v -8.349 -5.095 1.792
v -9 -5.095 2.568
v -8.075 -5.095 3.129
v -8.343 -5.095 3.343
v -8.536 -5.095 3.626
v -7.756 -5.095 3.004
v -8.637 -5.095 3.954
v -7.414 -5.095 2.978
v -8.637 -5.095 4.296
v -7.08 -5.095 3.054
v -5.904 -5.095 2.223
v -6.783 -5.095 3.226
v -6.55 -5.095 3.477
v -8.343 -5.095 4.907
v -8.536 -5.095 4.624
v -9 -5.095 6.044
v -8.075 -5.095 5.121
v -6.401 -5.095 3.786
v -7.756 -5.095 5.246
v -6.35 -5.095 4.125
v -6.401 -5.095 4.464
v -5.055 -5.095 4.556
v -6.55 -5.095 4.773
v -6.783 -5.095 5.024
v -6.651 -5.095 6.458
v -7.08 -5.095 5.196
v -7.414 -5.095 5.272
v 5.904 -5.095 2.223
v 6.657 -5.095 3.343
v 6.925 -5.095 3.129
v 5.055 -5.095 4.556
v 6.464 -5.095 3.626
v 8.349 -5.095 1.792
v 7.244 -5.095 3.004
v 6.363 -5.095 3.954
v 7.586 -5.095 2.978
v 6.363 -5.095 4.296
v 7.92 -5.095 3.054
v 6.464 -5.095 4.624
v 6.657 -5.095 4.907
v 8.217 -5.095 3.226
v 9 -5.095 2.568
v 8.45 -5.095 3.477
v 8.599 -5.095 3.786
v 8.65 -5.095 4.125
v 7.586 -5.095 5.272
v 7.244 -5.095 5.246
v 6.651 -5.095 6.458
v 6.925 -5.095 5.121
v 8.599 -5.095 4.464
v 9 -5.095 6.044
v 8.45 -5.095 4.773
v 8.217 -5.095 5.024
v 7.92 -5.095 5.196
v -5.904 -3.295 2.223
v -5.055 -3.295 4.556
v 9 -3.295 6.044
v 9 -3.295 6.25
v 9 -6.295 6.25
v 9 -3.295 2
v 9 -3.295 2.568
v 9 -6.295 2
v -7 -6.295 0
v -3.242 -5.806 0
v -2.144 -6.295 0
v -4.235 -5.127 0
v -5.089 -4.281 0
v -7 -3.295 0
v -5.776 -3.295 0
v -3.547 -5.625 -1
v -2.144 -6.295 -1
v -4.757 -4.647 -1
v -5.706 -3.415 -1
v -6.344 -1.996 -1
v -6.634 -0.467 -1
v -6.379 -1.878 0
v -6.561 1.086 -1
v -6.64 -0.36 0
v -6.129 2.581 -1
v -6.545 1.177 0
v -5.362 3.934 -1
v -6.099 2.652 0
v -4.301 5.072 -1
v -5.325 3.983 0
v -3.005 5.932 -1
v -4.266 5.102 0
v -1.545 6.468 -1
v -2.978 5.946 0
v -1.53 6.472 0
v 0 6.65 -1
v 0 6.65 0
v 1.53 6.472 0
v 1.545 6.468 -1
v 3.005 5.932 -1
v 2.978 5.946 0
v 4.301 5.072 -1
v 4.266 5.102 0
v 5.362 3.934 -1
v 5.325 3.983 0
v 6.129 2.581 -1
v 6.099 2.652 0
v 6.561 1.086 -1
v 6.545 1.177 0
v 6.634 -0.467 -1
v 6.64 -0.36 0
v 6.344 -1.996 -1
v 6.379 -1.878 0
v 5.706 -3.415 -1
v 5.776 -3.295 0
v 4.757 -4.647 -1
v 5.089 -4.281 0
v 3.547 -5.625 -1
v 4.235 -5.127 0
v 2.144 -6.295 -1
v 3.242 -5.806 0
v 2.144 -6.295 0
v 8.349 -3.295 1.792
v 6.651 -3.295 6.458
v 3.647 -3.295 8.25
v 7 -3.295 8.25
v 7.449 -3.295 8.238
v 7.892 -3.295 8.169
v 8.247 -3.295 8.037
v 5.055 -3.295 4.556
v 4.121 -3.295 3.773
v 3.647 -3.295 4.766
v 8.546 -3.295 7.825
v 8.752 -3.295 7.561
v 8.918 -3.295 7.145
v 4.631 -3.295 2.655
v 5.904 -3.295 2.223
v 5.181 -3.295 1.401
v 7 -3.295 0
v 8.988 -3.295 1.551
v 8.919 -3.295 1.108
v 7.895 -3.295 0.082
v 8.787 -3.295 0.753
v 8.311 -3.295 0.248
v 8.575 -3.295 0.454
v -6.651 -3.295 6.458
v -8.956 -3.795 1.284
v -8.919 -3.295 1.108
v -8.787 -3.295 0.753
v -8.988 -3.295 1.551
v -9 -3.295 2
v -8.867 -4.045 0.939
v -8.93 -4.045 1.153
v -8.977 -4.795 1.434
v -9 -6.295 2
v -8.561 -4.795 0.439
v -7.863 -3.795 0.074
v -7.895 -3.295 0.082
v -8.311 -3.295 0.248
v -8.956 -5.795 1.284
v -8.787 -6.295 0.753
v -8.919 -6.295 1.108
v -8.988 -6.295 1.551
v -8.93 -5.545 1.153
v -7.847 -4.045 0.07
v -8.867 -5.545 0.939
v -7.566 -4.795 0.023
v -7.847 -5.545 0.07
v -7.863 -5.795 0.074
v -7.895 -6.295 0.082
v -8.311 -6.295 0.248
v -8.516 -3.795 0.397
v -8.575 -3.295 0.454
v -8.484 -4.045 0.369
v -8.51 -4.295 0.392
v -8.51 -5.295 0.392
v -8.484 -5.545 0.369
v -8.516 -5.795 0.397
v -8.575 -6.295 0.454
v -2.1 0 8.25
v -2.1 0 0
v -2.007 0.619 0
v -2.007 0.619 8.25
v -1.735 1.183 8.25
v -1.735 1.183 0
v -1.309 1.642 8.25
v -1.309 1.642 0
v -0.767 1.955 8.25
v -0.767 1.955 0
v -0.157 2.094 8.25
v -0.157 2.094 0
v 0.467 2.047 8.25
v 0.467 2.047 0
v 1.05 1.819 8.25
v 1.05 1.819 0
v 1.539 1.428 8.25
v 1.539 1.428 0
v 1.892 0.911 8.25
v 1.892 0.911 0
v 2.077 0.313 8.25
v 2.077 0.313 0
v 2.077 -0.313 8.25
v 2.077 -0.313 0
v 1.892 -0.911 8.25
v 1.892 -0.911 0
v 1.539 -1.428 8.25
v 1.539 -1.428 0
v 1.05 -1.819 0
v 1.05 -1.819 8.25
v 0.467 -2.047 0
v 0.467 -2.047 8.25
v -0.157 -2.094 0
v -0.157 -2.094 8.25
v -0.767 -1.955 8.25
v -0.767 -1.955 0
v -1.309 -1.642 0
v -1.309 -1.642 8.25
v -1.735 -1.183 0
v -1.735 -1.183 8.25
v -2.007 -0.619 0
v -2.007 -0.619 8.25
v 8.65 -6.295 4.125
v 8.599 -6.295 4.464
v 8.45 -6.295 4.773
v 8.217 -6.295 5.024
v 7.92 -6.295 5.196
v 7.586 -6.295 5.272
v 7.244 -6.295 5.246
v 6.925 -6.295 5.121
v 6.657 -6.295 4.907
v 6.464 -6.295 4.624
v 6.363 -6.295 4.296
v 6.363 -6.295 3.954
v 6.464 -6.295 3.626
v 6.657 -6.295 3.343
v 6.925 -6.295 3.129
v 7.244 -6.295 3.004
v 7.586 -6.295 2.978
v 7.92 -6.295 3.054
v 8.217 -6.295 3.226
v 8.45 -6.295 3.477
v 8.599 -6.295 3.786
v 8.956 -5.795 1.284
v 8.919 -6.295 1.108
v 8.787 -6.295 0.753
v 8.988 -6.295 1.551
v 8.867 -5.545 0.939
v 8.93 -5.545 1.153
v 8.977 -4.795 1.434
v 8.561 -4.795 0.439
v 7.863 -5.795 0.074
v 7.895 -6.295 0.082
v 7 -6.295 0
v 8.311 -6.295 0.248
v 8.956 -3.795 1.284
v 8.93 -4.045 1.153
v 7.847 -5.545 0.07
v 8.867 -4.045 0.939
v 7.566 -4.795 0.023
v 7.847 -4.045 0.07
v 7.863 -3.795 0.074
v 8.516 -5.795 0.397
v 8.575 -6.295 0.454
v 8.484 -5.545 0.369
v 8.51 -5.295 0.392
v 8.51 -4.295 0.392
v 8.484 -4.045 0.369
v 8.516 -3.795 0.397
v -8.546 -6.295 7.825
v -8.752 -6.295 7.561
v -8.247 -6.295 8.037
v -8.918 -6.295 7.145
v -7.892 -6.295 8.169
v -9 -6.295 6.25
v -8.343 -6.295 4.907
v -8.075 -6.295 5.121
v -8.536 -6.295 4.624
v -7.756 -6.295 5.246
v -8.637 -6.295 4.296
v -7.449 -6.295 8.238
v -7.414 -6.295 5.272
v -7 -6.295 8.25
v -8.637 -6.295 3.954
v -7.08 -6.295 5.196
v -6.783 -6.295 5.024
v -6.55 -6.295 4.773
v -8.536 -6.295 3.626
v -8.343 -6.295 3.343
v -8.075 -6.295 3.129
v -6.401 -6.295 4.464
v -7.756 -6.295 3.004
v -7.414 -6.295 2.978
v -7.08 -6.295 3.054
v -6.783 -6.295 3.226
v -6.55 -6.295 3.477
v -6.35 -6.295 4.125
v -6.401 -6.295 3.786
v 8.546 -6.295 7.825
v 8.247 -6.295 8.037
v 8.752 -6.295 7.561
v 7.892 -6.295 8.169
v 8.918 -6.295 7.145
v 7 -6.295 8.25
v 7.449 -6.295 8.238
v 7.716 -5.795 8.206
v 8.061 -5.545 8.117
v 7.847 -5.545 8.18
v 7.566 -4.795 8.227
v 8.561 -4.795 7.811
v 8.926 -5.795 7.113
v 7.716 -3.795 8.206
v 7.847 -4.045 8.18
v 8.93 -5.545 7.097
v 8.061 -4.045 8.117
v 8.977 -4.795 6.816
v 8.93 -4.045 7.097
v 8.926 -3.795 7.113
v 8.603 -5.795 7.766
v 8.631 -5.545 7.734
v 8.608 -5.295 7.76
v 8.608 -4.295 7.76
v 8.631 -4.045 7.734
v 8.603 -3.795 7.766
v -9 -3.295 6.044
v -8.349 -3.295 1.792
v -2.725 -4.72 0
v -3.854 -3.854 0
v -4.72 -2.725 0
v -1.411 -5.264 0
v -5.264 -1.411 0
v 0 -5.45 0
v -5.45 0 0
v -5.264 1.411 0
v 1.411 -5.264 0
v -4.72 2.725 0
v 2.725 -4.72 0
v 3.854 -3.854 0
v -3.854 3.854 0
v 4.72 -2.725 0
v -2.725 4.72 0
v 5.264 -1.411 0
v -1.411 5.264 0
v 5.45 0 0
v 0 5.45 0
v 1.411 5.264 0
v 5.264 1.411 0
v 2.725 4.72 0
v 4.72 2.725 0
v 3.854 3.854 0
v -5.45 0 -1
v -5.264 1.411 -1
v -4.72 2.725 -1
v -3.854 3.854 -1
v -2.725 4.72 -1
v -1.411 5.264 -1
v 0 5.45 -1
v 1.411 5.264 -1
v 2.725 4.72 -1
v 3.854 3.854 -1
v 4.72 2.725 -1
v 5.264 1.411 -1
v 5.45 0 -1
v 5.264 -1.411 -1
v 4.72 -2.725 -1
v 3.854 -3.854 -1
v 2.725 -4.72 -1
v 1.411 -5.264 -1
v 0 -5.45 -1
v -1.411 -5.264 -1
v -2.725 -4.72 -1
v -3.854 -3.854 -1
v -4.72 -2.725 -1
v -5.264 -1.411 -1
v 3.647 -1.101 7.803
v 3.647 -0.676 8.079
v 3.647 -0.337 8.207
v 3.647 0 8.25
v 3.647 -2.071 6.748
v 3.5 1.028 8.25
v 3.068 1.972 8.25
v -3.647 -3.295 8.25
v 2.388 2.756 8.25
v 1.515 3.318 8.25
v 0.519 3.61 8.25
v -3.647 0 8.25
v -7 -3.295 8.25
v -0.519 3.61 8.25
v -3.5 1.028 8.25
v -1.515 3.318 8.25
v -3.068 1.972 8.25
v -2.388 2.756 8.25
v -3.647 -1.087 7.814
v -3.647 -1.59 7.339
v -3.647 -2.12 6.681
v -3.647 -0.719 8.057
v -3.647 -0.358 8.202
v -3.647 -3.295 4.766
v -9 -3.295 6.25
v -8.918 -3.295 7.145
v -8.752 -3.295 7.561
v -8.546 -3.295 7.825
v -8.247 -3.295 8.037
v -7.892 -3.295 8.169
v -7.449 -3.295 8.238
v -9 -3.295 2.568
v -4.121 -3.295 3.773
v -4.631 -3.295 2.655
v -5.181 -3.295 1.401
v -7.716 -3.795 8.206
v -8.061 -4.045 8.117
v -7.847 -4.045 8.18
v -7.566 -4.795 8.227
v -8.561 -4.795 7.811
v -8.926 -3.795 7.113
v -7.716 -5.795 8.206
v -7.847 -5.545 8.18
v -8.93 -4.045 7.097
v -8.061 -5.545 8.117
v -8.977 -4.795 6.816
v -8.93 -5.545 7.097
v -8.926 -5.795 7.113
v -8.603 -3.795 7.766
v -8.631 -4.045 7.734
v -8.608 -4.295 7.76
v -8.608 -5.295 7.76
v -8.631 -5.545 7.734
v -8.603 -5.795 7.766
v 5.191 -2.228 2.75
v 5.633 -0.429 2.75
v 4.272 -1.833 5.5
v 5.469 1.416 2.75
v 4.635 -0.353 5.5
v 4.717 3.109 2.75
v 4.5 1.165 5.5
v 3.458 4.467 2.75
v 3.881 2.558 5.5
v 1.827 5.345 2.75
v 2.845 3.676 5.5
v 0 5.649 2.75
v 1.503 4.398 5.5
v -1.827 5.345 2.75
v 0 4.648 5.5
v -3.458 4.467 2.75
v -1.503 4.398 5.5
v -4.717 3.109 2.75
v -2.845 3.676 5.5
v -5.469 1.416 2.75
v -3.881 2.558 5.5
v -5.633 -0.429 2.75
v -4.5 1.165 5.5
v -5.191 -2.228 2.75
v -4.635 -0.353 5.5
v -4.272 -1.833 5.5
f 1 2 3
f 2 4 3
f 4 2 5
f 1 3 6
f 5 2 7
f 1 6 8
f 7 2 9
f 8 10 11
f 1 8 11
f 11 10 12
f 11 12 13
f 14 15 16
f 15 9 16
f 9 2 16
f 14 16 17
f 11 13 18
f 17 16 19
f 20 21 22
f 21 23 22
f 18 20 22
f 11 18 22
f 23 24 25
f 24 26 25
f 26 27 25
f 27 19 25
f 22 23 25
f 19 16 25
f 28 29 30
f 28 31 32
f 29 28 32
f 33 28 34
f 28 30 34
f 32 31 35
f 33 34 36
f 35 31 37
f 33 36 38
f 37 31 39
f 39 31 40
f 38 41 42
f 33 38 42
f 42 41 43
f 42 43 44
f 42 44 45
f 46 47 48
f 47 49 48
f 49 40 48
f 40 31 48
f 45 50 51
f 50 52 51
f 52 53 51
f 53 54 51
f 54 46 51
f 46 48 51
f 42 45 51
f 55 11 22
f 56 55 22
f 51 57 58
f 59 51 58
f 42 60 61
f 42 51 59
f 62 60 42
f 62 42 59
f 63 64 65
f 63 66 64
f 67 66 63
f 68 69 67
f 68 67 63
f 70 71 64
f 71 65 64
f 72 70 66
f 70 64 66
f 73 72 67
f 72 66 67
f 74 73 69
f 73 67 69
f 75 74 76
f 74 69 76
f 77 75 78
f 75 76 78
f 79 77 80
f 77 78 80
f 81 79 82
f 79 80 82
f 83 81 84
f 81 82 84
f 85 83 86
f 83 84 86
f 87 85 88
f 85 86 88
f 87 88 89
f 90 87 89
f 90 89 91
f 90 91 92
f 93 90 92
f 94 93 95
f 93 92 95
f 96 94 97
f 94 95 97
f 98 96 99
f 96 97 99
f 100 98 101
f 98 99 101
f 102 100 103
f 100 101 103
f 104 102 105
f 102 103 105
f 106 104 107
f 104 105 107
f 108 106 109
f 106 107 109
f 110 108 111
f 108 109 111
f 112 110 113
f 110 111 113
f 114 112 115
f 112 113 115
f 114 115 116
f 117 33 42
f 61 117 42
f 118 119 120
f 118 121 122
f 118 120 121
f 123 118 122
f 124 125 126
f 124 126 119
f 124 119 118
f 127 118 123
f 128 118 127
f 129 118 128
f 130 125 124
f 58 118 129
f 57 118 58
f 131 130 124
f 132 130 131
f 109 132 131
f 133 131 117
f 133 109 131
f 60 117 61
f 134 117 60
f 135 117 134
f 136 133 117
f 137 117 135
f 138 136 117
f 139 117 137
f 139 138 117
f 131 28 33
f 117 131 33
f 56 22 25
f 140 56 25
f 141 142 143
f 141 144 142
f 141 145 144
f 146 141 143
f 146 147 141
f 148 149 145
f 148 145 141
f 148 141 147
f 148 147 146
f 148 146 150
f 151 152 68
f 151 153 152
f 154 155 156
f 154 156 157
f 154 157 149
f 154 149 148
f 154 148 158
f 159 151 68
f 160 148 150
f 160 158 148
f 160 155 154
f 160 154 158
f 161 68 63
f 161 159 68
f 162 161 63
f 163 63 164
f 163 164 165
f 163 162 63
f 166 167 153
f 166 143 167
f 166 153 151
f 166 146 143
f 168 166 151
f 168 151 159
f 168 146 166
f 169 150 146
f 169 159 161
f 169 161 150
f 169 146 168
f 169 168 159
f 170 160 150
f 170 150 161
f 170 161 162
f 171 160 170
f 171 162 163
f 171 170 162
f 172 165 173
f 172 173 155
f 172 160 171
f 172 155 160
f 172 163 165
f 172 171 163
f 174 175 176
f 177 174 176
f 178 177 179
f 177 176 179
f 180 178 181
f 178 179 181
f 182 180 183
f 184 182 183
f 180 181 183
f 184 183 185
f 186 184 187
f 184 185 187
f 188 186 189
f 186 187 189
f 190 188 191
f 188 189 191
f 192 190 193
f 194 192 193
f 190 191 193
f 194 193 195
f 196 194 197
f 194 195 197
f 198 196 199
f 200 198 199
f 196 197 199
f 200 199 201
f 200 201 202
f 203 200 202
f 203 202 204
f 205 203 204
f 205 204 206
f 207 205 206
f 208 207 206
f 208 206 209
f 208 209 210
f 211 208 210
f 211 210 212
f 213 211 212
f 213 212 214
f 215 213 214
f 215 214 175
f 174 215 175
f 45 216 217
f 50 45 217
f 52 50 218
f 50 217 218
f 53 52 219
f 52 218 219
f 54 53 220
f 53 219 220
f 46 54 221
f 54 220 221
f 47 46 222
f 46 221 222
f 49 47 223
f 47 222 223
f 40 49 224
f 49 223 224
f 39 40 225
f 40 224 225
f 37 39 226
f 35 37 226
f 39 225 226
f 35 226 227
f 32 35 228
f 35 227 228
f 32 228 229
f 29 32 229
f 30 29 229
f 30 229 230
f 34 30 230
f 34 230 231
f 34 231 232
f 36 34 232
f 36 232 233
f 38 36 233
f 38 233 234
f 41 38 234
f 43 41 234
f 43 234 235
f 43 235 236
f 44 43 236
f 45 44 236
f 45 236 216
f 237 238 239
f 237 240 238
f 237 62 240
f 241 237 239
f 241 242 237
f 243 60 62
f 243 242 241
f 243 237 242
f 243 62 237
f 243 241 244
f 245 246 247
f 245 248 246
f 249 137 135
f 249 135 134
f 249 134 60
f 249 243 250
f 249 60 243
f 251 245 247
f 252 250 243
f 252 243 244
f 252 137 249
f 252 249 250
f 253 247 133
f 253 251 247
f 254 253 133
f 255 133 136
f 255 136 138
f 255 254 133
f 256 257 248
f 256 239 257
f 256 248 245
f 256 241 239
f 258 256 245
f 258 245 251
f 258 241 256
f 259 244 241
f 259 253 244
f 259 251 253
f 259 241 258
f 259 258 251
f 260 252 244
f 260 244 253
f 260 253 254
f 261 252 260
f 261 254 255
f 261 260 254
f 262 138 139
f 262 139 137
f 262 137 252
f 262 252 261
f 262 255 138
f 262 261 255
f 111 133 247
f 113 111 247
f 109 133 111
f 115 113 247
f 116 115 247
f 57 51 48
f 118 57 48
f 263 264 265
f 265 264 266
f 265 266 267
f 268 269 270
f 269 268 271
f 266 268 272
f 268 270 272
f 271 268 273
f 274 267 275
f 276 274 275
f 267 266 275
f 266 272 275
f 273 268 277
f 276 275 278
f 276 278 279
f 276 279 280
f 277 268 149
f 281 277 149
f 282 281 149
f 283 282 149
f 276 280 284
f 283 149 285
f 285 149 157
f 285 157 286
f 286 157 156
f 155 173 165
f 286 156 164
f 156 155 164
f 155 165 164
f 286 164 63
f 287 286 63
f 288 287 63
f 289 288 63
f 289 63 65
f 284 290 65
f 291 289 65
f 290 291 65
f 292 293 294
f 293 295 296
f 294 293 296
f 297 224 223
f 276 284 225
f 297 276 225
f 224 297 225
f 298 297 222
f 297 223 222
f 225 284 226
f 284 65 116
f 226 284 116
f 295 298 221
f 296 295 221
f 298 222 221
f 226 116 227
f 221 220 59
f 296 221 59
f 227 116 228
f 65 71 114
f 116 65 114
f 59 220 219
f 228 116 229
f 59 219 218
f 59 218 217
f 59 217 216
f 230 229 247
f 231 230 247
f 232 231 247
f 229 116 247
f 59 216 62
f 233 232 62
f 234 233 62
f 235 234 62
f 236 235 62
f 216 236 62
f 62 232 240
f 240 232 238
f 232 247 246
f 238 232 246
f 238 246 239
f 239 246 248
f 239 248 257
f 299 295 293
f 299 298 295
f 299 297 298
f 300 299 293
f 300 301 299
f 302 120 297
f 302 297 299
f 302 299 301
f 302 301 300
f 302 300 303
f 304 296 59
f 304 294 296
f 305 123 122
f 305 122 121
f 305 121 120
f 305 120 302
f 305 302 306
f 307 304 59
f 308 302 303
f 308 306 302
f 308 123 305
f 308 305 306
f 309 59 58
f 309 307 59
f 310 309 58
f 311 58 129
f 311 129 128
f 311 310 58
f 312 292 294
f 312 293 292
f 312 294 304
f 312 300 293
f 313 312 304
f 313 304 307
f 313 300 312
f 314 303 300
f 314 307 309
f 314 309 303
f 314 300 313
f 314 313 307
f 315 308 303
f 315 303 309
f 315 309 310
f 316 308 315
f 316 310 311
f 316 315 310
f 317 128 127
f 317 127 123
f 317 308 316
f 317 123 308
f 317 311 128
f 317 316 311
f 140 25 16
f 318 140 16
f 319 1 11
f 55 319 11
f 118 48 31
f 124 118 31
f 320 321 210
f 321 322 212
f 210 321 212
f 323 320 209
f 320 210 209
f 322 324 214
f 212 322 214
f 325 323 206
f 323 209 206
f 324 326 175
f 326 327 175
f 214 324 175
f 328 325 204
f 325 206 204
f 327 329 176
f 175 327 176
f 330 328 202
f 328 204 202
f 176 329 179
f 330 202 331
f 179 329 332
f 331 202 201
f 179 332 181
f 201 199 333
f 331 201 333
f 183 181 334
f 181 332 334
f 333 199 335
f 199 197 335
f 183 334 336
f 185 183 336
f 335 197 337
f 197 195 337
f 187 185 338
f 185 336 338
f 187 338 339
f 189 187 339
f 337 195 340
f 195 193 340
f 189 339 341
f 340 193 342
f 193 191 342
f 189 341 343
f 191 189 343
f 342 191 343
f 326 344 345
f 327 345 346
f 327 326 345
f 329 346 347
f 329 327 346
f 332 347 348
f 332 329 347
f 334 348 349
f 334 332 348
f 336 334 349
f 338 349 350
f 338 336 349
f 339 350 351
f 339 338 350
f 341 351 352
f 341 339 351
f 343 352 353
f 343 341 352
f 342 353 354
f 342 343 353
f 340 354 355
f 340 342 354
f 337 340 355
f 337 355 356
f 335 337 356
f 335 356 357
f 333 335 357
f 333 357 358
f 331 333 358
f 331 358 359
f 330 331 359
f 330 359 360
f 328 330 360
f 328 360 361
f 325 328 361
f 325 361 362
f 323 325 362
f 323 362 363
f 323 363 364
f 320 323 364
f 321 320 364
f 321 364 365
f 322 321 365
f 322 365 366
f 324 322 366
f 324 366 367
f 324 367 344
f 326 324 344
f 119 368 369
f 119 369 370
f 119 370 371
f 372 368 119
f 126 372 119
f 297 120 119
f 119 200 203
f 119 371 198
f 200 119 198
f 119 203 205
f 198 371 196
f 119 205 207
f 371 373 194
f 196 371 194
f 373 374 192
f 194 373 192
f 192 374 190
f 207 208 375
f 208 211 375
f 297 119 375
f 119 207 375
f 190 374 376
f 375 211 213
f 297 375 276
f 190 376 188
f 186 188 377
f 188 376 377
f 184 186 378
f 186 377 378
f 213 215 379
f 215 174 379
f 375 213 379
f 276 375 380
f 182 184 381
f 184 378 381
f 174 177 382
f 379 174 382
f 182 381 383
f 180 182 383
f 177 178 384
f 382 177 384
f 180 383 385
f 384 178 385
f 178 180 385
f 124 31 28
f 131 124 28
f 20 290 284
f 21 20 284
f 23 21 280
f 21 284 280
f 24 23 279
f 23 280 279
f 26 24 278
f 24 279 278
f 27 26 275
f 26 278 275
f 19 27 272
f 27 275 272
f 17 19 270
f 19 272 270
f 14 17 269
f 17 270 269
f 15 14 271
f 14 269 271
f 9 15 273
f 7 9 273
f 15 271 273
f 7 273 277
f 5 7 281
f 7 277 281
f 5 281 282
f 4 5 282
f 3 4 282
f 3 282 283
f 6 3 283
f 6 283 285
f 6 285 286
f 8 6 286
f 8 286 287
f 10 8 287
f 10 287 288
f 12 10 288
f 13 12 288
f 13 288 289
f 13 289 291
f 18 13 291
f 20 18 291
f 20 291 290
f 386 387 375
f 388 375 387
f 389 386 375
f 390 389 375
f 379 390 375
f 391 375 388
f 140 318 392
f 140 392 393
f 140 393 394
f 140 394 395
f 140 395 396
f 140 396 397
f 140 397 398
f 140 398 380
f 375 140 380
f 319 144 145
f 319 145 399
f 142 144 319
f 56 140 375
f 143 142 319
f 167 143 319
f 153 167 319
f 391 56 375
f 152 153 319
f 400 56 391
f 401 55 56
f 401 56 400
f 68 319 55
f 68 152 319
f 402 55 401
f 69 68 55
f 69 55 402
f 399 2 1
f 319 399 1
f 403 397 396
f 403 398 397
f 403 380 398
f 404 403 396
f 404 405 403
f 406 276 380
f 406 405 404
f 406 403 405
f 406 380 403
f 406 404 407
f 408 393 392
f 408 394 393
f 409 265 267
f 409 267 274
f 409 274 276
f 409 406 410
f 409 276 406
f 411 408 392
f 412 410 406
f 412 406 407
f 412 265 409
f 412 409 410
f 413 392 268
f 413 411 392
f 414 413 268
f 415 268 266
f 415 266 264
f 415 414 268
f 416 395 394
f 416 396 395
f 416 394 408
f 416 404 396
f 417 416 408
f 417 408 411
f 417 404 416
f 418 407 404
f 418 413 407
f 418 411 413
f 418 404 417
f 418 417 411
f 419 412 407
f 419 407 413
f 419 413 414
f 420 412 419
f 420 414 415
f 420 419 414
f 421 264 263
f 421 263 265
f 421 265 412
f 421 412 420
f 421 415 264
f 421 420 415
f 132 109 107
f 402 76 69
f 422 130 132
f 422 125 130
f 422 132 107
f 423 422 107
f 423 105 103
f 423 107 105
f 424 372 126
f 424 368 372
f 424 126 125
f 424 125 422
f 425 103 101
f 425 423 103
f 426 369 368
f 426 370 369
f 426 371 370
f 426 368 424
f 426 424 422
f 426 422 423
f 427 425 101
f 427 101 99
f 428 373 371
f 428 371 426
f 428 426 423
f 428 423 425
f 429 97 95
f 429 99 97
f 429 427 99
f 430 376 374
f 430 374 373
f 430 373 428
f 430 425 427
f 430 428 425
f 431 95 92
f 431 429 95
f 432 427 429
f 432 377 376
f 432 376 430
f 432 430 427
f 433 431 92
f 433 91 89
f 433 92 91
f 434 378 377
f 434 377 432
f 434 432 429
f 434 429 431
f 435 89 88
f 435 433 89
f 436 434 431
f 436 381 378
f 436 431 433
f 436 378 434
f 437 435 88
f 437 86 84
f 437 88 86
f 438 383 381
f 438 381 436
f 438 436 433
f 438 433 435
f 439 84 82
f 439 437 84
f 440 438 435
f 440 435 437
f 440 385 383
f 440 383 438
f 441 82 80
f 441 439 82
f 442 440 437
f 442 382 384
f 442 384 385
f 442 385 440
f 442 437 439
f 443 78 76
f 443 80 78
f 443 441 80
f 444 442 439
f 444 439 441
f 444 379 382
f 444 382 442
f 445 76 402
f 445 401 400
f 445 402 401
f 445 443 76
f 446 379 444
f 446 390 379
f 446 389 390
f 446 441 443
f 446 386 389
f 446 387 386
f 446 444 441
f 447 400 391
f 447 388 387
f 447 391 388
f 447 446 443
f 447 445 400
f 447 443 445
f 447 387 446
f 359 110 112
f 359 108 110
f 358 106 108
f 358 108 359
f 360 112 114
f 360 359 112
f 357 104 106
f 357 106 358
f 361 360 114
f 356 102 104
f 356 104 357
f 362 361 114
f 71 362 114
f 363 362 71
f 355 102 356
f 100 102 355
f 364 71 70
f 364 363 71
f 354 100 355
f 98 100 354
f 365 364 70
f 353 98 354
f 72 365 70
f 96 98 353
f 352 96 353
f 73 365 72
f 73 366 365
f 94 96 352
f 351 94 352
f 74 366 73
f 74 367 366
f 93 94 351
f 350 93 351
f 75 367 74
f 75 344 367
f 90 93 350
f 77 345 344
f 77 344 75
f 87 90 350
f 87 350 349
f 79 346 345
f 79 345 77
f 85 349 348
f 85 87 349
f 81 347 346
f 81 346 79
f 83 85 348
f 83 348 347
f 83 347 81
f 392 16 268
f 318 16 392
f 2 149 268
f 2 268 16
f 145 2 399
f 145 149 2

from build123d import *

# Parameters (mm, degrees)
SKETCH1_R               = 6.65
BOSS_EXTRUDE1_DEPTH     = 8.25
BOSS_EXTRUDE1_TAPER     = 20
SKETCH2_R               = 6.65
SKETCH2_R_2             = 5.45
BOSS_EXTRUDE2_DEPTH     = 1
SKETCH3_R               = 2.1
CUT_EXTRUDE1_DEPTH      = 13.51029576
CUT_EXTRUDE2_DEPTH      = 13.51029576
CUT_EXTRUDE2_DEPTH_BACK = 13.51029576
SKETCH4_W               = 15
SKETCH4_H               = 5
SKETCH5_R               = 2.1
BOSS_EXTRUDE3_DEPTH     = 8.25
CUT_EXTRUDE3_REACH      = 20.994
CUT_EXTRUDE3_START      = -1.2
CUT_EXTRUDE4_REACH      = 19.794
SKETCH7_R               = 1.15
FILLET1_SIZE            = 2


with BuildPart() as part:
    # Sketch1 → Boss-Extrude1 (new body)
    with BuildSketch(Plane.XY):
        Circle(SKETCH1_R)
    extrude(amount=BOSS_EXTRUDE1_DEPTH, taper=BOSS_EXTRUDE1_TAPER)

    # Sketch2 → Boss-Extrude2 (add)
    with BuildSketch(Plane(origin=(0, 0, 0), x_dir=(-1, 0, 0), z_dir=(0, 0, -1))):
        Circle(SKETCH2_R)
        Circle(SKETCH2_R_2, mode=Mode.SUBTRACT)
    extrude(amount=BOSS_EXTRUDE2_DEPTH)

    # Sketch3 → Cut-Extrude1 (cut, through all)
    with BuildSketch(Plane(origin=(0, 0, 0), x_dir=(-1, 0, 0), z_dir=(0, 0, -1))):
        Circle(SKETCH3_R)
    extrude(amount=-CUT_EXTRUDE1_DEPTH, mode=Mode.SUBTRACT)

    # Sketch4 → Cut-Extrude2 (cut, two sides: drawn at the far end of the back side and taken through both)
    with BuildSketch(Plane.XY.offset(-CUT_EXTRUDE2_DEPTH_BACK)):
        with Locations((0, -8.795)):
            Rectangle(SKETCH4_W, SKETCH4_H)
    extrude(amount=CUT_EXTRUDE2_DEPTH + CUT_EXTRUDE2_DEPTH_BACK, mode=Mode.SUBTRACT)

    # Sketch5 → Boss-Extrude3 (add)
    with BuildSketch(Plane.XY):
        with BuildLine():
            Line((3.647245567, 0), (3.647245567, -3.295))
            Line((3.647245567, -3.295), (9, -3.295))
            Line((9, -3.295), (9, -6.295))
            Line((9, -6.295), (-9, -6.295))
            Line((-9, -6.295), (-9, -3.295))
            Line((-9, -3.295), (-3.647245567, -3.295))
            Line((-3.647245567, -3.295), (-3.647245567, 0))
            ThreePointArc((-3.647245567, 0), (0, 3.647245567), (3.647245567, 0))
        make_face()
        with Locations(Location((0, 0, 0), (0, 0, 180))):
            Circle(SKETCH5_R, mode=Mode.SUBTRACT)
    extrude(amount=BOSS_EXTRUDE3_DEPTH)

    # Sketch6 → Cut-Extrude3 (cut, up to next)
    with BuildSketch(Plane.XZ.offset(6.295).offset(CUT_EXTRUDE3_START), mode=Mode.PRIVATE) as cut_extrude3_sk1:
        Polygon((-6.650898686, 6.457886687), (-9.095788478, 6.026786651), (-9.944889792, 3.693899965), (-8.349101314, 1.792113313), (-5.904211522, 2.223213349), (-5.055110208, 4.556100035), align=None)
    cut_extrude3_tool1 = extrude(cut_extrude3_sk1.sketch, amount=-CUT_EXTRUDE3_REACH, mode=Mode.PRIVATE) & part.part
    # Sketch6 → Cut-Extrude3 (cut, up to next)
    with BuildSketch(Plane.XZ.offset(6.295).offset(CUT_EXTRUDE3_START), mode=Mode.PRIVATE) as cut_extrude3_sk2:
        Polygon((6.650898686, 6.457886687), (5.055110208, 4.556100035), (5.904211522, 2.223213349), (8.349101314, 1.792113313), (9.944889792, 3.693899965), (9.095788478, 6.026786651), align=None)
    cut_extrude3_tool2 = extrude(cut_extrude3_sk2.sketch, amount=-CUT_EXTRUDE3_REACH, mode=Mode.PRIVATE) & part.part
    add(cut_extrude3_tool1.solids().sort_by_distance((-7.5, -5.095, 4.125))[0], mode=Mode.SUBTRACT)
    add(cut_extrude3_tool2.solids().sort_by_distance((7.5, -5.095, 4.125))[0], mode=Mode.SUBTRACT)

    # Sketch7 → Cut-Extrude4 (cut, up to next)
    with BuildSketch(Plane.XZ.offset(6.295), mode=Mode.PRIVATE) as cut_extrude4_sk1:
        with Locations((7.5, 4.125)):
            Circle(SKETCH7_R)
    cut_extrude4_tool1 = extrude(cut_extrude4_sk1.sketch, amount=-CUT_EXTRUDE4_REACH, mode=Mode.PRIVATE) & part.part
    # Sketch7 → Cut-Extrude4 (cut, up to next)
    with BuildSketch(Plane.XZ.offset(6.295), mode=Mode.PRIVATE) as cut_extrude4_sk2:
        with Locations((-7.5, 4.125)):
            Circle(SKETCH7_R)
    cut_extrude4_tool2 = extrude(cut_extrude4_sk2.sketch, amount=-CUT_EXTRUDE4_REACH, mode=Mode.PRIVATE) & part.part
    add(cut_extrude4_tool1.solids().sort_by_distance((7.5, -6.295, 4.125))[0], mode=Mode.SUBTRACT)
    add(cut_extrude4_tool2.solids().sort_by_distance((-7.5, -6.295, 4.125))[0], mode=Mode.SUBTRACT)

    # Fillet1
    # a fillet whose section is not a circle: 2 mm, written as the material it takes off along each edge
    with BuildSketch(Plane(origin=(9, 1.705, 0), x_dir=(0, 0, 1), z_dir=(0, -1, 0)), Plane(origin=(9, 1.705, 8.25), x_dir=(-1, 0, 0), z_dir=(0, -1, 0)), Plane(origin=(-9, -11.295, 0), x_dir=(0, 0, 1), z_dir=(0, 1, 0)), Plane(origin=(-9, -11.295, 8.25), x_dir=(1, 0, 0), z_dir=(0, 1, 0))) as fillet1_piece_1:
        with BuildLine():
            add(Edge.make_bspline([(FILLET1_SIZE, 0), (FILLET1_SIZE * 0.831801948466, 0), (FILLET1_SIZE * 0.663603896932, 0), (FILLET1_SIZE * 0.292893218813, FILLET1_SIZE * 0.0716919198361), (FILLET1_SIZE * 0.0716919198361, FILLET1_SIZE * 0.292893218813), (0, FILLET1_SIZE * 0.663603896932), (0, FILLET1_SIZE * 0.831801948466), (0, FILLET1_SIZE)], knots=[0, 0, 0, 0, 0, 0, 0.5, 0.5, 1, 1, 1, 1, 1, 1], degree=5))
            Line((0, FILLET1_SIZE), (0, 0))
            Line((0, 0), (FILLET1_SIZE, 0))
        make_face()
    extrude(amount=13, mode=Mode.SUBTRACT)


solid = part.part
